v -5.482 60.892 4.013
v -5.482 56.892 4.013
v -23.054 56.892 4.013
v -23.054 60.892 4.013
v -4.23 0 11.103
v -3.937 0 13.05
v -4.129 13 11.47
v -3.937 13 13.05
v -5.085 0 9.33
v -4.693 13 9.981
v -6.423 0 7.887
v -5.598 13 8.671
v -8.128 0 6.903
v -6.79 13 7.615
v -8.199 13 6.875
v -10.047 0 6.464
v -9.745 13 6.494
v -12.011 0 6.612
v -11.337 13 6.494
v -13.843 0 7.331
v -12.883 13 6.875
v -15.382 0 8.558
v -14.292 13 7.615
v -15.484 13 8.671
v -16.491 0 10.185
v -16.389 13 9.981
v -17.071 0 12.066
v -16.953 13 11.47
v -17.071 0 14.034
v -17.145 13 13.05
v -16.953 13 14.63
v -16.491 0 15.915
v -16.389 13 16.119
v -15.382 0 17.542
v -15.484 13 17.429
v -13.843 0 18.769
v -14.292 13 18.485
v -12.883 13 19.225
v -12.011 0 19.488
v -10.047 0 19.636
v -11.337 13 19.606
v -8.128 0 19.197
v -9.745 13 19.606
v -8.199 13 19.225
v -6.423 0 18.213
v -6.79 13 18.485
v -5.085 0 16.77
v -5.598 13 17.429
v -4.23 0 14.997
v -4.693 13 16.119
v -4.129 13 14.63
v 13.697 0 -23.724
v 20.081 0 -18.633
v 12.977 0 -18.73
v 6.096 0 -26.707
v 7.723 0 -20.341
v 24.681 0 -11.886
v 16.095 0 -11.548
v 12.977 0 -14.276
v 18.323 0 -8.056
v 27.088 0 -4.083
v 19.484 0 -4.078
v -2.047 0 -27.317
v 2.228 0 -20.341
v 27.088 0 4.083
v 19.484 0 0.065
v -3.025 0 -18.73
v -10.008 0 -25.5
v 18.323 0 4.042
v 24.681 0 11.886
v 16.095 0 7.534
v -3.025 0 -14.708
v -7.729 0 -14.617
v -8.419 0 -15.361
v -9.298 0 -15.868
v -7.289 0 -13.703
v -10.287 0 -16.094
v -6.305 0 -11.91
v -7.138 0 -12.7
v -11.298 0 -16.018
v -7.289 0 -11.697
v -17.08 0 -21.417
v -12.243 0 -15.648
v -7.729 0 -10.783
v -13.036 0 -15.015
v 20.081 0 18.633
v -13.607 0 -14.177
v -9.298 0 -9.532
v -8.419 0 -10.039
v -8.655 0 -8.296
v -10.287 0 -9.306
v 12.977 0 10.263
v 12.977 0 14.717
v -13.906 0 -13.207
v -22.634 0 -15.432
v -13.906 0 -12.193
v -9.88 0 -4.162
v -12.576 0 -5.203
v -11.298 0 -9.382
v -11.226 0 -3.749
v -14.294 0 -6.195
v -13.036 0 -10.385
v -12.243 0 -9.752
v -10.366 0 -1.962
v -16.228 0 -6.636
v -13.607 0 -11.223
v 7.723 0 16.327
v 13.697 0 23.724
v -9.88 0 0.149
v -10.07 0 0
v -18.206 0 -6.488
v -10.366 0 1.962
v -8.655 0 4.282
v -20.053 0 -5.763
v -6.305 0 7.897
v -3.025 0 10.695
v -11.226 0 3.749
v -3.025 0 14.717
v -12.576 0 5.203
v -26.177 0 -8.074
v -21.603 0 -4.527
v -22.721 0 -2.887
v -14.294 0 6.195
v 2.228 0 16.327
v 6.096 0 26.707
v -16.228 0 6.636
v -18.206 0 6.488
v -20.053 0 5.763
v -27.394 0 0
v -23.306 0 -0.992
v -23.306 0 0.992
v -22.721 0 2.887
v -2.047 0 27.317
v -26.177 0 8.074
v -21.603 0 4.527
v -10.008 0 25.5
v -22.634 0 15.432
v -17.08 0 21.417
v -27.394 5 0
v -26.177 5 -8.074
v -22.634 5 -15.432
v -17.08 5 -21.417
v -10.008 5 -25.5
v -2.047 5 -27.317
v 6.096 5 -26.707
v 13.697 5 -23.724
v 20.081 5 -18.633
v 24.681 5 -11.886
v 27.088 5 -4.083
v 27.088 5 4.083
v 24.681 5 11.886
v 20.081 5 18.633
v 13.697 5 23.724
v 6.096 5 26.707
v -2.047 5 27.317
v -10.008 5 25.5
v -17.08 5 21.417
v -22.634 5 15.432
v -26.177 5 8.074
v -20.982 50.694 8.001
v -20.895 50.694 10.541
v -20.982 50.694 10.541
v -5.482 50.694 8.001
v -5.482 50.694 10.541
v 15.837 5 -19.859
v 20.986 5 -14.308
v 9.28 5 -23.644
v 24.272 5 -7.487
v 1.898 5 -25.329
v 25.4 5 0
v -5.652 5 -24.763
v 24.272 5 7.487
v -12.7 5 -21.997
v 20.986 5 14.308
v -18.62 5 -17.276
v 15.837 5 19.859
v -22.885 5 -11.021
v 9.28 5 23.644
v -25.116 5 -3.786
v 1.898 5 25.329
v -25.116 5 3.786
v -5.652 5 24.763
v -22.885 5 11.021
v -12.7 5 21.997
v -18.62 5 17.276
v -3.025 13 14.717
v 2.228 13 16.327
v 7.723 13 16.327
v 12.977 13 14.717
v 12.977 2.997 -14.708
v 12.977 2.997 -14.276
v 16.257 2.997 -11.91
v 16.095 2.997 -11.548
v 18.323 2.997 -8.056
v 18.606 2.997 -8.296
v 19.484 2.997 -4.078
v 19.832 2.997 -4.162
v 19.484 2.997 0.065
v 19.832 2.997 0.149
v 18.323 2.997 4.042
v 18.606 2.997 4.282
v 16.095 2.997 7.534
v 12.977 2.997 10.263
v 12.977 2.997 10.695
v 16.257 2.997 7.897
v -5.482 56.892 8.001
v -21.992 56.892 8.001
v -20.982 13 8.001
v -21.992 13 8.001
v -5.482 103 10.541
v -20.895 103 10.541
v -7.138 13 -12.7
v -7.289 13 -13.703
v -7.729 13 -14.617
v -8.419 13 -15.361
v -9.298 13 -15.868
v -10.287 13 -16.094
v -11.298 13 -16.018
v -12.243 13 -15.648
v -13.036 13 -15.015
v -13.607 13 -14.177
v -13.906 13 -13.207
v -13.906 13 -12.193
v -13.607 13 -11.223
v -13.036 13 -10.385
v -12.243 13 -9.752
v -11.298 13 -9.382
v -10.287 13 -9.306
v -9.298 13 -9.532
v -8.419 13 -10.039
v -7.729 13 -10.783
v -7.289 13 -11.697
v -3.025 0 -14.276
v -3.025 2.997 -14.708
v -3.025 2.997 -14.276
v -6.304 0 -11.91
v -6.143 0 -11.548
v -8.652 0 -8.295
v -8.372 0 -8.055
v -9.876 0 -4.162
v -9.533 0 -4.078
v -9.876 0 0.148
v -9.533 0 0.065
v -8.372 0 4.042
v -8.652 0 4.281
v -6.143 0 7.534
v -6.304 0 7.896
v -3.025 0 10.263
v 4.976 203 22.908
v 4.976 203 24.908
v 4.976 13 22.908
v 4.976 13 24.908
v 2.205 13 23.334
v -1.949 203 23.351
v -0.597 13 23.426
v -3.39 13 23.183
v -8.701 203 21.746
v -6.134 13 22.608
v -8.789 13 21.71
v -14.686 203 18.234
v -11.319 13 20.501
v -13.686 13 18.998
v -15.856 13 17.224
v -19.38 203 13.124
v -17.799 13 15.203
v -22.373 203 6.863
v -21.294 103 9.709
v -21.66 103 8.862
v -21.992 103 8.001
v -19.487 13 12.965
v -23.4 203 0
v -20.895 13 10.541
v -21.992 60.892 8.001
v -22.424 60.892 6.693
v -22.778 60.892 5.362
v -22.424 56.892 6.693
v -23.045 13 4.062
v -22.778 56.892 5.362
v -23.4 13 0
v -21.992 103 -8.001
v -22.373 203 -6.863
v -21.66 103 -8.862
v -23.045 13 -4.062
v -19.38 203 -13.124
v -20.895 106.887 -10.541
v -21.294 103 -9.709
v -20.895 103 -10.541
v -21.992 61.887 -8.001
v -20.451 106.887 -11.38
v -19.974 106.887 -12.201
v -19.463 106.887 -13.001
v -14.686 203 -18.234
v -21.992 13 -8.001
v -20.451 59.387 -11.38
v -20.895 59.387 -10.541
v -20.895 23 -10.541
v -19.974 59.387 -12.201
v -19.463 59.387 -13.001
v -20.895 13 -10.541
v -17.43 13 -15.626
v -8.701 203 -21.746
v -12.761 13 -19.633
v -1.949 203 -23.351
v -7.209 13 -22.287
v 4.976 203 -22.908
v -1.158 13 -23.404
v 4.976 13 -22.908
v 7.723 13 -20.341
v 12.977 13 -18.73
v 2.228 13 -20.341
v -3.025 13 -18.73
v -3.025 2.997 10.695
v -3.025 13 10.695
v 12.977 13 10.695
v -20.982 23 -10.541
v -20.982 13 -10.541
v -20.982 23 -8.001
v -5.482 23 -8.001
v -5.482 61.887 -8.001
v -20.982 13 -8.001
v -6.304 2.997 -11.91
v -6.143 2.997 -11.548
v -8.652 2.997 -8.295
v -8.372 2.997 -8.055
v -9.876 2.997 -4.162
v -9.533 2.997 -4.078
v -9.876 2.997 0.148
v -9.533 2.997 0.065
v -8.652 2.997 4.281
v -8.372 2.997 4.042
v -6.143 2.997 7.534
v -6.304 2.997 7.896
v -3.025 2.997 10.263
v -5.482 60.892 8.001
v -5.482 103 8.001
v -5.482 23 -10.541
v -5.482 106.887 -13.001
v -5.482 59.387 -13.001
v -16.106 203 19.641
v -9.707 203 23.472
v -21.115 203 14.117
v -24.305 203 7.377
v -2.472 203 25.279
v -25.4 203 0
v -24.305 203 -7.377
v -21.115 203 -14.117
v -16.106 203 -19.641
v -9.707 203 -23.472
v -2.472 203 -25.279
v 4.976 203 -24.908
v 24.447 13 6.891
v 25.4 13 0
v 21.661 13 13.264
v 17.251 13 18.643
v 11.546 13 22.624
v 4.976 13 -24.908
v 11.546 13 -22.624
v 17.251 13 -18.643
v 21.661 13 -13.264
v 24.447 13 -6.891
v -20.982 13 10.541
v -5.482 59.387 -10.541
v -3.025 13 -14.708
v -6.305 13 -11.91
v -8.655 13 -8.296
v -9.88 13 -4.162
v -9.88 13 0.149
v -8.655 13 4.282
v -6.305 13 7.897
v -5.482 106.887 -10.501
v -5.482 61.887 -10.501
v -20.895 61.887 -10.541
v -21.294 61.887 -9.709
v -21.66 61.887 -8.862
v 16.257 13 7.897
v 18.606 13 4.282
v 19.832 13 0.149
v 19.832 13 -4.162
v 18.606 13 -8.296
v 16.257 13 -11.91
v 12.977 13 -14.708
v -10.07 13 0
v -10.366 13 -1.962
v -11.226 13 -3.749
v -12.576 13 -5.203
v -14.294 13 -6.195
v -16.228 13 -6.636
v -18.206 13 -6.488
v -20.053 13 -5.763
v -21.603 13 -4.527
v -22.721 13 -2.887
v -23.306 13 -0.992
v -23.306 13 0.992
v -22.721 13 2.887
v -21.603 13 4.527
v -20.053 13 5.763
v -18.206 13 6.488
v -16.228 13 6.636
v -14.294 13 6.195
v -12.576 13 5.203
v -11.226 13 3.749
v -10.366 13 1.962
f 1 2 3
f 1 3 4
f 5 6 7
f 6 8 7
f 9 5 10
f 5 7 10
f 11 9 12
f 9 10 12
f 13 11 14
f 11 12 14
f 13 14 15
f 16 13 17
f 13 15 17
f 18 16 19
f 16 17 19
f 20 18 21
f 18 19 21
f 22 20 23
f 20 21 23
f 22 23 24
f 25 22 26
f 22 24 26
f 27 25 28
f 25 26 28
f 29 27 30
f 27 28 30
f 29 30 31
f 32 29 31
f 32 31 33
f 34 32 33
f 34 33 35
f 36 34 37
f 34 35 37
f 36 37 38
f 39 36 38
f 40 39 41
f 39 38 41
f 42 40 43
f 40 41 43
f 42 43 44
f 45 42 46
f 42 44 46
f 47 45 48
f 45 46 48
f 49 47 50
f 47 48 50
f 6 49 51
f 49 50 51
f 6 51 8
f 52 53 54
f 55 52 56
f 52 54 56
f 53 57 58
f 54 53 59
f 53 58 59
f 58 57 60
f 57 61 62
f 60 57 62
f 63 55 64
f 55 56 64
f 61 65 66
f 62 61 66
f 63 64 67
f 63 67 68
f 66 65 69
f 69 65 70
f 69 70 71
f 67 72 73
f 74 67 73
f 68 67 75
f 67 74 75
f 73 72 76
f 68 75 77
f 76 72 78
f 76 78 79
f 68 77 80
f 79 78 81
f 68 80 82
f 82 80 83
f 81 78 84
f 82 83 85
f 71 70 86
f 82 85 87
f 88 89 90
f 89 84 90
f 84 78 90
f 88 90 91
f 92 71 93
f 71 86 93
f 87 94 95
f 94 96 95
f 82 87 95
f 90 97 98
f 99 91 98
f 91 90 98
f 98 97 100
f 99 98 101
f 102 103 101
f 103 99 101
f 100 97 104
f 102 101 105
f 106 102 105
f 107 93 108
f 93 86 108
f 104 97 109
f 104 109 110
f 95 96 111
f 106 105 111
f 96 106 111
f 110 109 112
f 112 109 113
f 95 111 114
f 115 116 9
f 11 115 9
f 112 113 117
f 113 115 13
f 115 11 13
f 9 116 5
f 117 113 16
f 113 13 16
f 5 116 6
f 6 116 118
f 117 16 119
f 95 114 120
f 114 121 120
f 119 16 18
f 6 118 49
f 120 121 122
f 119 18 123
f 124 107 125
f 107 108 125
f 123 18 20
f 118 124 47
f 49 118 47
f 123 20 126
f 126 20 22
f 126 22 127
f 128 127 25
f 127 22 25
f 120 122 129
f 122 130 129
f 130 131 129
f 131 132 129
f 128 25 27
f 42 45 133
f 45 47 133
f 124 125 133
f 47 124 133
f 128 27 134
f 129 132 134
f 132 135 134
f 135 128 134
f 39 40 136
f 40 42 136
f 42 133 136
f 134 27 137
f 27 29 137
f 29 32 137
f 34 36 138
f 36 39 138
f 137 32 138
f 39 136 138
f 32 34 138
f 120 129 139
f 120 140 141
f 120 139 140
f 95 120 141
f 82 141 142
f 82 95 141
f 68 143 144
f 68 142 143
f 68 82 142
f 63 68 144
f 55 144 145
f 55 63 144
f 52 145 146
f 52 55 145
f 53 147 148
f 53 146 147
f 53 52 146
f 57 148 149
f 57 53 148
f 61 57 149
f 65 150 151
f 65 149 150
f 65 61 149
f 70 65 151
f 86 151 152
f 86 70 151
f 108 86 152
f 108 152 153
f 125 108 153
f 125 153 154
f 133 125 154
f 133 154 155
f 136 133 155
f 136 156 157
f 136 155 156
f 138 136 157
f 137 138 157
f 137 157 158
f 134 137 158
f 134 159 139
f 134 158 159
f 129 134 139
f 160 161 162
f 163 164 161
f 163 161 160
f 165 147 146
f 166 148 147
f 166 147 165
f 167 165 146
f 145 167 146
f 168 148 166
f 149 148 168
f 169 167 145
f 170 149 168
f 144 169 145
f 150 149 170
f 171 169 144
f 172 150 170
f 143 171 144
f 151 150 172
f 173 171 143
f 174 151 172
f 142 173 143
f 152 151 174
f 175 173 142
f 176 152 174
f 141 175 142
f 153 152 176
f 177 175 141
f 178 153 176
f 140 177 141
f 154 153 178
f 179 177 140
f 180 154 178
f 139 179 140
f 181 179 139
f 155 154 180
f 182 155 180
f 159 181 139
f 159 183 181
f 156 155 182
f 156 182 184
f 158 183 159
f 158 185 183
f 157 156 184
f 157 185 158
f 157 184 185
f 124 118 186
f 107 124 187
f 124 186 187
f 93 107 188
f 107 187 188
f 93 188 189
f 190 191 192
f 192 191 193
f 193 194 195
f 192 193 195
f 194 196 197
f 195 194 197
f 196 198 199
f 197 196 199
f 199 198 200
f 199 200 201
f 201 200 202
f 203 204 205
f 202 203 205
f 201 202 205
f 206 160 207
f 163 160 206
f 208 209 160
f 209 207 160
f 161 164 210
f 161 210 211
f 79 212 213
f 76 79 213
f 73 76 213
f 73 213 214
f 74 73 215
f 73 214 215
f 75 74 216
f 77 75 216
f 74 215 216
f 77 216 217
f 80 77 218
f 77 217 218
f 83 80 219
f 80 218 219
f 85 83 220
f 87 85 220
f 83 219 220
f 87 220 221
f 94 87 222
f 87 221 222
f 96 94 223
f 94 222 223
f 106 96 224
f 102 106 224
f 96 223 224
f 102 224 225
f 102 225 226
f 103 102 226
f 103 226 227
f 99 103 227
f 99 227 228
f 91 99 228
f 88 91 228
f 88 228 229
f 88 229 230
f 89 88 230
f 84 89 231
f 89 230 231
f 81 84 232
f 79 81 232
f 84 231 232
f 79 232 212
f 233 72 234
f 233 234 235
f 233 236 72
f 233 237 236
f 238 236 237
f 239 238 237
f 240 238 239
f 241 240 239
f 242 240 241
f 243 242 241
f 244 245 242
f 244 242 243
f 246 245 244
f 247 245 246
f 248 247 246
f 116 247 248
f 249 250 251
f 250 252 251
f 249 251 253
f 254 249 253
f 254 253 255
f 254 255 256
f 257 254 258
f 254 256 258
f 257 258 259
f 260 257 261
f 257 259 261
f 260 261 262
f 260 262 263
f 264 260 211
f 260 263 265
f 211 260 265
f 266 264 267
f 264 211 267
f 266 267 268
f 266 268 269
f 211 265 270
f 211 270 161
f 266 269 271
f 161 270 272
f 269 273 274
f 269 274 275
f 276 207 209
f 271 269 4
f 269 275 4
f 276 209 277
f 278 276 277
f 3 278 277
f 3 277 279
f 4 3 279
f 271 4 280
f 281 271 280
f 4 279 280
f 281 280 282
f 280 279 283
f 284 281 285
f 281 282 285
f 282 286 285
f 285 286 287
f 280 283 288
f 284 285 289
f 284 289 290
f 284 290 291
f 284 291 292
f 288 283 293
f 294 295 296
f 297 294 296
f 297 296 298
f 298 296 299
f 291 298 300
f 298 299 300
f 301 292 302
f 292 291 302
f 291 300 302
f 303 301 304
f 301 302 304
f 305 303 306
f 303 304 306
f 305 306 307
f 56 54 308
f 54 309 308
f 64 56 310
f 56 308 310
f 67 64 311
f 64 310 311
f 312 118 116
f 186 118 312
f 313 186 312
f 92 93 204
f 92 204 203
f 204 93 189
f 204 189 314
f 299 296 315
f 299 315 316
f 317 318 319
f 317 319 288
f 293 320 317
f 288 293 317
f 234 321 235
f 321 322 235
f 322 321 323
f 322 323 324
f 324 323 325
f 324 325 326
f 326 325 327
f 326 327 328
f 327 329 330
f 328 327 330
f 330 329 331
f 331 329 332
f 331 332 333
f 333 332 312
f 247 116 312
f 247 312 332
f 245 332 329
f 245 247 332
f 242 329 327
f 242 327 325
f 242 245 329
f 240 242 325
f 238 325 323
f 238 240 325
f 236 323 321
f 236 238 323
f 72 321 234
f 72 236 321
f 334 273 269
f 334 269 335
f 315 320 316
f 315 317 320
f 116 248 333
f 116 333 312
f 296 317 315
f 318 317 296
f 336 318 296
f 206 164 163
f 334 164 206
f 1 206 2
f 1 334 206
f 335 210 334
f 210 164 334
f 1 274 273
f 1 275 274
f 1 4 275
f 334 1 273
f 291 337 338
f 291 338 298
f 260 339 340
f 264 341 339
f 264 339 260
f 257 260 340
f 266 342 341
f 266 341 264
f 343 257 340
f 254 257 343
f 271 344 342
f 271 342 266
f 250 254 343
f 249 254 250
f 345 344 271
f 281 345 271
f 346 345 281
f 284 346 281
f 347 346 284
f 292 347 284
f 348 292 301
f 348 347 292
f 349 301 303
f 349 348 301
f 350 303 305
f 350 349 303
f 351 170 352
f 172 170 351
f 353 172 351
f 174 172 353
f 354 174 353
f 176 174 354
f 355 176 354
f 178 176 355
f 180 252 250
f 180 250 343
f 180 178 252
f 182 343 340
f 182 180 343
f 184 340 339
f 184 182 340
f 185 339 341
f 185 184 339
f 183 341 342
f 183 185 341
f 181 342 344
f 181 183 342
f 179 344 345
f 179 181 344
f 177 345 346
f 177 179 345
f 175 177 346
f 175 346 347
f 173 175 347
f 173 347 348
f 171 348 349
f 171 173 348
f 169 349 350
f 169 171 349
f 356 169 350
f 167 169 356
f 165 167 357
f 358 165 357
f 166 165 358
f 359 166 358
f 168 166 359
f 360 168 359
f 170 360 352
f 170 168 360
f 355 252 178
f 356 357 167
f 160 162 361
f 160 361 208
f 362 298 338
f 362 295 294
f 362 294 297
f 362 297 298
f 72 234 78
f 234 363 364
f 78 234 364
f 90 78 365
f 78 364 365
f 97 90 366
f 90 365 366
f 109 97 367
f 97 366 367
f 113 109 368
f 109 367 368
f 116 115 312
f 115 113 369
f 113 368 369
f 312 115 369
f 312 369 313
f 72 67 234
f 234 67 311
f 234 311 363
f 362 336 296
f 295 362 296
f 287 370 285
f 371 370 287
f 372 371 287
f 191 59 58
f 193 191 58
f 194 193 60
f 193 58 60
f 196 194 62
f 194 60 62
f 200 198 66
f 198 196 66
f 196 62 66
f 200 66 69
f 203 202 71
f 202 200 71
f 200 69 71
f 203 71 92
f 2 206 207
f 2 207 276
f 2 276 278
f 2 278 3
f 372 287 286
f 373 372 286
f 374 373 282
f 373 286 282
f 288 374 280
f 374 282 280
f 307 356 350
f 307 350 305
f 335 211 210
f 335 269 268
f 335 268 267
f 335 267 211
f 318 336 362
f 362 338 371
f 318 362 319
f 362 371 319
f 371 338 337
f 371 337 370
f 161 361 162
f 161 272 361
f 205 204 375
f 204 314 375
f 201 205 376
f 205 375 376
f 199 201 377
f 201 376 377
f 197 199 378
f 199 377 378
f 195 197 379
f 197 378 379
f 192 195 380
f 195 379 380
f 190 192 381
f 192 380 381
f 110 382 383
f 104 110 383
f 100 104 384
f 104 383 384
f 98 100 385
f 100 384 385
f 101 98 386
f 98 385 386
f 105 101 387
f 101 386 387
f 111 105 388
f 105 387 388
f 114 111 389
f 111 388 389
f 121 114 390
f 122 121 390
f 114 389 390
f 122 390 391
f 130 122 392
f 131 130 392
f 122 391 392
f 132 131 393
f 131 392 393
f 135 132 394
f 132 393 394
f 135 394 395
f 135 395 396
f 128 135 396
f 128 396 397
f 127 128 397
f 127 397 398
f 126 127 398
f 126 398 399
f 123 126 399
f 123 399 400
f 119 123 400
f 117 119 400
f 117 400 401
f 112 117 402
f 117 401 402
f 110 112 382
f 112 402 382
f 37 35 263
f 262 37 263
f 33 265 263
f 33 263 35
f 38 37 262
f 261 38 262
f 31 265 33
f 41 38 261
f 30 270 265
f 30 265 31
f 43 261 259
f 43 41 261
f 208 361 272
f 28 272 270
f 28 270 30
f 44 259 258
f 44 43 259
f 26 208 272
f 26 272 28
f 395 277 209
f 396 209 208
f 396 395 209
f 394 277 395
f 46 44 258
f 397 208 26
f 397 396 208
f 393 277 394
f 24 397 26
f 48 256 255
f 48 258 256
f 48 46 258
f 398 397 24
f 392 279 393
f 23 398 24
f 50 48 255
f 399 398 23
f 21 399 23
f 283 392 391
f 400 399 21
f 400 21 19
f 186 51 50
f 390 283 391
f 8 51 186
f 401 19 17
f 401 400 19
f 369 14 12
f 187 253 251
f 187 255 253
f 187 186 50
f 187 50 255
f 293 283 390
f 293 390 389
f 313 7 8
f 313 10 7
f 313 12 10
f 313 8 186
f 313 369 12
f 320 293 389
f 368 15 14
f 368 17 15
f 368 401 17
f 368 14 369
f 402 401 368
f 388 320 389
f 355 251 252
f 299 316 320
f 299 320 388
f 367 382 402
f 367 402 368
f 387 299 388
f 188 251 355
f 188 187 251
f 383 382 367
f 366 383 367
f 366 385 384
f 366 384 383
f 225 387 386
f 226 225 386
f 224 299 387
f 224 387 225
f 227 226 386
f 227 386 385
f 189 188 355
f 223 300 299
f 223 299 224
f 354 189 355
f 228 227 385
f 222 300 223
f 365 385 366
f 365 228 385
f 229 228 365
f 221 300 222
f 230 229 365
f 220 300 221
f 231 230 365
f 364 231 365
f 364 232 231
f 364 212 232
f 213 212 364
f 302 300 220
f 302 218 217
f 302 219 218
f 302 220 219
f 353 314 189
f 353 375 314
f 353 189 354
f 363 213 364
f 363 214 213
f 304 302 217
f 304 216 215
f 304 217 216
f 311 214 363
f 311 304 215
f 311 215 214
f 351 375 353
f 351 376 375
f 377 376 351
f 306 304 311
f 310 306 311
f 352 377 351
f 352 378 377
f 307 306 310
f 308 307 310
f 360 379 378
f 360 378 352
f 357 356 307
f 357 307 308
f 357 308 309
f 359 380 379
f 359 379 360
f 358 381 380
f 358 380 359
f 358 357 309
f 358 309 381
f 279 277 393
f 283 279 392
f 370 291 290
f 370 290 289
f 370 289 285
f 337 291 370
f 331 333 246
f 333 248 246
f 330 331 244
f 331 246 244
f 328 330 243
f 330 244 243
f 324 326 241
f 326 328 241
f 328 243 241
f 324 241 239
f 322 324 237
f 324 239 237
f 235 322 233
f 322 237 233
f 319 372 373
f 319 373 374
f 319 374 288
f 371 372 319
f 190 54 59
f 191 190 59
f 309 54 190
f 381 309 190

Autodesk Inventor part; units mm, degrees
ref_plane "YZ Plane" through (0, 0, 0) normal (1, 0, 0) x (0, 1, 0)
ref_plane "XZ Plane" through (0, 0, 0) normal (0, 1, 0) x (-1, 0, 0)
ref_plane "XY Plane" through (0, 0, 0) normal (0, 0, 1) x (1, 0, 0)
sketch "Sketch1" plane through (0, 0, 0) normal (0, 1, 0) x (-1, 0, 0)
  circle A0 centre (0, 0) radius 27.3939
  dimension "d0" = 54.7878
extrude "Extrusion1" add sketch "Sketch1" along normal blind 5
sketch "Sketch2" plane through (0, 5, 0) normal (0, 1, 0) x (1, 0, 0)
  circle A0 centre (0, 0) radius 25.4
  dimension "d3" = 50.8
extrude "Extrusion2" add sketch "Sketch2" along normal blind 8
sketch "Sketch3" plane through (0, 13, 0) normal (0, 1, 0) x (1, 0, 0)
  line L0 (0, 0) -> (0, 25.4)
  circle A0 centre (0, 0) radius 25.4
  line L1 (0, 0) -> (0, -25.4)
  arc A1 (0, 25.4) -> (0, -25.4) centre (0, 0) ccw
  line L2 (0, -25.4) -> (4.975722, -24.907874)
  arc A2 (0, -25.4) -> (4.975722, -24.907874) centre (0, 0) ccw
  line L3 (0, 25.4) -> (4.975722, 24.907874)
  arc A3 (4.975722, 24.907874) -> (0, 25.4) centre (0, 0) ccw
  line L4 (4.975722, 24.907874) -> (4.975722, 22.907874)
  line L5 (4.975722, -24.907874) -> (4.975722, -22.907874)
  line L6 (-25.4, 0) -> (-23.4, 0)
  arc A4 (4.975722, 22.907874) -> (4.975722, -22.907874) centre (0.034686, 0) ccw
  dimension "d6" = 25.4
  dimension "d7" = 5
  dimension "d8" = 5
  dimension "d9" = 2
  dimension "d10" = 2
  dimension "d11" = 2
extrude "Extrusion3" add sketch "Sketch3" along normal blind 190 contours A4 L6 A0 L0 | L0 L3 L4 A4 | A4 L5 L2 L1 | L1 A0 L6 A4 | A0 L3 | L2 A0
sketch "Sketch4" plane through (0, 13, 0) normal (0, 1, 0) x (1, 0, 0)
  line L0 (4.975722, 22.907874) -> (4.975722, 24.907874)
  line L1 (4.975722, 22.907874) -> (4.975722, 20.545874)
  line L2 (4.975722, 20.545874) -> (4.975722, -16.532126)
  line L3 (4.975722, -16.532126) -> (4.975722, 2.006874)
  circle A0 centre (4.975722, 2.006874) radius 18.539
  line L4 (4.975722, -16.532126) -> (-3.025278, -16.532126)
  line L5 (-3.025278, -16.532126) -> (4.975722, -16.532126)
  line L6 (4.975722, -16.532126) -> (12.976722, -16.532126)
  line L7 (4.975722, 20.545874) -> (12.976722, 20.545874)
  line L8 (4.975722, 20.545874) -> (-3.025278, 20.545874)
  line L9 (-3.025278, 20.545874) -> (-3.025278, 18.730466)
  line L10 (12.976722, 20.545874) -> (12.976722, 18.730466)
  line L11 (12.976722, -16.532126) -> (12.976722, -14.716718)
  line L12 (-3.025278, -16.532126) -> (-3.025278, -14.716718)
  arc A1 (-3.025278, -14.716718) -> (12.976722, -14.716718) centre (4.975722, 2.006874) ccw
  arc A2 (12.976722, 18.730466) -> (-3.025278, 18.730466) centre (4.975722, 2.006874) ccw
  line L13 (12.976722, -14.716718) -> (12.976722, -10.728918)
  line L14 (-3.025278, -14.716718) -> (-3.025278, -10.728918)
  line L15 (-3.025278, 18.730466) -> (-3.025278, 14.742666)
  line L16 (12.976722, 18.730466) -> (12.976722, 14.742666)
  circle A3 centre (4.975722, 2.006874) radius 15.0114
  line L17 (12.976722, -10.728918) -> (12.976722, -10.694548)
  line L18 (-3.025278, -10.728918) -> (-3.025278, -10.694548)
  line L19 (-3.025278, 14.742666) -> (-3.025278, 14.708296)
  line L20 (12.976722, 14.742666) -> (12.976722, 14.708296)
  point P0 (0, 0)
  dimension "d14" = 2.362
  dimension "d15" = 37.078
  dimension "d16" = 18.539
  dimension "d18" = 8.001
  dimension "d19" = 8.001
  dimension "d20" = 8.001
  dimension "d21" = 8.001
  dimension "d22" = 3.9878
  dimension "d23" = 3.9878
  dimension "d24" = 3.9878
  dimension "d25" = 3.9878
  dimension "d26" = 30.0228
extrude "Extrusion4" cut sketch "Sketch4" against normal blind 15 contours A0 L16 L20 A3 L2 | L2 A3 L19 L15 A0 | A3 L2 | L2 A3 | L14 L18 A3 L2 A0 | A3 L17 L13 A0 L2
sketch "Sketch5" plane through (0, 0, 0) normal (0, -1, 0) x (1, 0, 0)
  arc A0 (-3.025278, 10.694548) -> (-3.025278, -14.708296) centre (4.975722, -2.006874) ccw
  line L0 (-3.025278, 10.694548) -> (-3.025278, 10.262748)
  line L1 (-3.025278, -14.708296) -> (-3.025278, -14.276296)
  line L2 (12.976722, -14.708296) -> (12.976722, -14.276496)
  arc A1 (12.976722, -14.708296) -> (12.976722, 10.694548) centre (4.975722, -2.006874) ccw
  line L3 (12.976722, 10.694548) -> (12.976722, 10.262748)
  line L4 (19.987122, -2.006874) -> (19.631522, -2.006874)
  line L5 (-10.035678, -2.006874) -> (-9.680078, -2.006874)
  arc A2 (-3.025278, 10.262748) -> (-3.025278, -14.276296) centre (4.958044, -2.006774) ccw
  arc A3 (-3.025278, 10.694548) -> (-3.025278, -14.708296) centre (4.975722, -2.006874) ccw
  arc A4 (-3.025278, 10.694548) -> (-3.025278, -14.708296) centre (4.984051, -2.006874) ccw
  arc A5 (12.976722, -14.276496) -> (12.976722, 10.262748) centre (4.993216, -2.006874) ccw
  arc A6 (12.976722, -14.708296) -> (12.976722, 10.694548) centre (4.975722, -2.006874) ccw
  point P0 (0, 0)
  dimension "d29" = 0.4318
  dimension "d30" = 0.432
  dimension "d31" = 0.4318
  dimension "d32" = 0.4318
  dimension "d33" = 0.3556
  dimension "d34" = 0.3556
sketch "Sketch5 outline for Extrusion5" plane through (0, 0, 0) normal (0, -1, 0) x (1, 0, 0)
  line L0 (-3.025278, 10.262748) -> (-3.025278, 10.694548)
  arc A0 (-3.025278, -14.276296) -> (-3.025278, 10.262748) centre (4.958044, -2.006774) cw
  line L1 (-3.025278, -14.708296) -> (-3.025278, -14.276296)
  arc A1 (-3.025278, 10.694548) -> (-3.025278, -14.708296) centre (4.984051, -2.006874) ccw
  line L2 (12.976722, 10.694548) -> (12.976722, 10.262748)
  arc A2 (12.976722, -14.708296) -> (12.976722, 10.694548) centre (4.975722, -2.006874) ccw
  line L3 (12.976722, -14.276496) -> (12.976722, -14.708296)
  arc A3 (12.976722, 10.262748) -> (12.976722, -14.276496) centre (4.993216, -2.006874) cw
extrude "Extrusion5" add sketch "Sketch5 outline for Extrusion5" against normal blind 2.997
sketch "Sketch6" plane through (0, 13, 0) normal (0, 1, 0) x (1, 0, 0)
  line L0 (0, 0) -> (-16.725, 0)
  circle A0 centre (-16.725, 0) radius 6.655
  line L1 (-16.725, 0) -> (-16.725, 12.7)
  line L2 (0, 0) -> (0, 28.039513)
  line L3 (-16.725, 12.7) -> (0, 12.7)
  line L4 (0, 12.7) -> (-10.541, 12.7)
  circle A1 centre (-10.541, 12.7) radius 3.4035
  line L5 (-16.725, 0) -> (-16.725, -13.05)
  line L6 (-16.725, -13.05) -> (0.459, -13.05)
  line L7 (0.459, -13.05) -> (-10.541, -13.05)
  circle A2 centre (-10.541, -13.05) radius 6.604
  dimension "d37" = 16.725
  dimension "d38" = 13.31
  dimension "d39" = 12.7
  dimension "d40" = 10.541
  dimension "d41" = 6.807
  dimension "d42" = 13.05
  dimension "d43" = 11
  dimension "d44" = 13.208
extrude "Extrusion6" cut sketch "Sketch6" against normal blind 15 contours A0 L5 L0 | L0 L1 A0 | L5 A0 L1 | A1 L3 | L3 A1 | A2 L6 L5 | L5 L6 A2
sketch "Sketch12" plane through (0, 13, 0) normal (0, 1, 0) x (1, 0, 0)
  circle A0 centre (-16.725, 0) radius 6.655
  line L0 (-16.725, 0) -> (-16.725, -8.001)
  line L1 (-16.725, 0) -> (-16.725, 8.001)
  line L2 (-16.725, 8.001) -> (-21.991855, 8.001)
  arc A1 (4.975722, 22.907874) -> (4.975722, -22.907874) centre (0.034686, 0) ccw
  line L3 (-21.991855, 8.001) -> (-5.481855, 8.001)
  line L4 (-16.725, -8.001) -> (-21.991855, -8.001)
  line L5 (-21.991855, -8.001) -> (-5.481855, -8.001)
  line L6 (-5.481855, -8.001) -> (-5.481855, -10.541)
  line L7 (-5.481855, -10.541) -> (-20.89548, -10.541)
  line L8 (-5.481855, 8.001) -> (-5.481855, 10.541)
  line L9 (-5.481855, 10.541) -> (-20.89548, 10.541)
  arc A2 (-20.89548, 10.541) -> (-21.991855, 8.001) centre (0.034686, 0) ccw
  arc A3 (-21.991855, -8.001) -> (-20.89548, -10.541) centre (0.034686, 0) ccw
  point P0 (0, 0)
  dimension "d74" = 8.001
  dimension "d75" = 8.001
  dimension "d76" = 16.51
  dimension "d77" = 16.51
  dimension "d78" = 2.54
  dimension "d79" = 2.54
extrude "Extrusion10" add sketch "Sketch12" along normal blind 90 contours L2 A1 L9 L8 L3 | L5 L6 L7 A1 L4
sketch "Sketch13" plane through (-5.481855, 13, 8.001) normal (1, 0, 0) x (0, 0, -1)
  line L0 (0, 0) -> (-2.54, 0)
  line L1 (-2.54, 0) -> (-2.54, 37.6936)
  line L2 (-2.54, 37.6936) -> (0, 37.6936)
  line L3 (0, 37.6936) -> (0, 0)
  line L4 (16.002, 0) -> (18.542, 0) projected
  line L5 (18.542, 0) -> (16.002, 0)
  line L6 (16.002, 0) -> (16.002, 10)
  line L7 (16.002, 10) -> (18.542, 10)
  line L8 (18.542, 10) -> (18.542, 0)
  line L9 (16.002, 10) -> (16.002, 48.8874)
  line L10 (16.002, 48.8874) -> (18.542, 48.8874)
  line L11 (18.542, 90) -> (18.542, 0) projected
  line L12 (18.542, 48.8874) -> (18.542, 90)
  line L13 (16.002, 0) -> (16.002, 90) projected
  line L14 (16.002, 90) -> (16.002, 48.8874)
  line L15 (18.542, 90) -> (16.002, 90)
  point P0 (8.001, -13)
  dimension "d83" = 37.6936
  dimension "d84" = 10
  dimension "d85" = 38.8874
sketch "Sketch14" plane through (0, 103, 0) normal (0, 1, 0) x (1, 0, 0)
  line L0 (-5.481855, 8.001) -> (-5.481855, 10.541)
  line L1 (-5.481855, 10.541) -> (-5.481855, 8.001)
  line L2 (-5.481855, 10.541) -> (-20.801621, 10.541)
  arc A0 (-20.89548, 10.541) -> (-21.991855, 8.001) centre (0.034686, 0) ccw
  arc A1 (-20.89548, 10.541) -> (-20.89548, -10.541) centre (0.034686, 0) ccw
  line L3 (-5.481855, 8.001) -> (-21.991855, 8.001)
  line L4 (-5.481855, 10.541) -> (-20.89548, 10.541)
  point P0 (0, 0)
extrude "Extrusion11" cut sketch "Sketch14" against normal blind 41.113
sketch "Sketch15" plane through (0, 13, 0) normal (0, -1, 0) x (1, 0, 0)
  line L0 (-20.89548, -10.541) -> (-5.481855, -10.541)
  line L1 (-5.481855, -10.541) -> (-20.89548, -10.541)
  line L2 (-8.787002, -8.001) -> (-21.991855, -8.001)
  line L3 (-5.481763, -8.001) -> (-21.991855, -8.001)
  arc A0 (-21.991855, -8.001) -> (-20.89548, -10.541) centre (0.034686, 0) ccw
  line L4 (-16.649824, 10.541) -> (-5.481855, 10.541)
  line L5 (-5.481855, 10.541) -> (-21.991855, 10.541)
  line L6 (-5.481855, 8.001) -> (-6.21287, 8.001)
  line L7 (-5.481855, 10.541) -> (-5.481855, 8.001)
  line L8 (-5.481855, 8.001) -> (-20.514232, 8.001)
  line L9 (-5.481855, 10.541) -> (-21.991855, 10.541)
  arc A1 (4.975722, 22.907874) -> (-20.89548, 10.541) centre (0.034686, 0) ccw
  line L10 (-20.89548, 10.541) -> (-23.544024, 10.541)
  line L11 (-23.544024, 10.541) -> (-21.025013, 10.541)
  line L12 (-20.89548, 10.541) -> (-5.481855, 10.541)
  line L13 (-5.481855, 8.001) -> (-24.106928, 8.001)
  circle A2 centre (0, 0) radius 25.4
  arc A3 (-23.109464, 10.541) -> (-24.106928, 8.001) centre (0, 0) ccw
  line L14 (-23.109464, 10.541) -> (-5.481855, 10.541)
extrude "Extrusion12" cut sketch "Sketch13" against normal blind 15.5 contours L0 L1 L2 L3 | L6 L7 L8 L4
sketch "Sketch16" plane through (0, 61.887, 0) normal (0, 1, 0) x (1, 0, 0)
  line L0 (-5.481855, 8.001) -> (-21.991855, 8.001)
  line L1 (-5.481855, 8.001) -> (-5.481855, 13.001)
  line L2 (-5.481855, 10.501) -> (-20.89548, 10.541)
  arc A0 (-20.89548, 10.541) -> (-21.991855, 8.001) centre (0.034686, 0) ccw
  arc A1 (-20.89548, 10.541) -> (-21.991855, 8.001) centre (0.034686, 0) ccw
  line L3 (-5.481855, 13.001) -> (-19.462968, 13.001)
  arc A2 (-19.462968, 13.001) -> (-20.89548, 10.541) centre (0.034686, 0) ccw
  point P0 (0, 0)
  dimension "d90" = 5
extrude "Extrusion13" add sketch "Sketch16" along normal blind 45 contours L2 A2 L3 L1
sketch "Sketch17" plane through (0, 61.887, 0) normal (0, -1, 0) x (1, 0, 0)
  line L0 (-5.481855, -13.001) -> (-5.481855, -10.541)
  arc A0 (-20.89548, -10.541) -> (-19.462968, -13.001) centre (0.034686, 0) ccw
  line L1 (-20.89548, -10.541) -> (-5.481855, -10.541)
  line L2 (-20.89548, -10.541) -> (-5.481855, -10.541)
  line L3 (-5.481855, -13.001) -> (-19.462968, -13.001)
  line L4 (-19.462968, -13.001) -> (-5.481855, -13.001)
  arc A1 (-20.89548, -10.541) -> (-19.462968, -13.001) centre (0.034686, 0) ccw
  point P0 (0, 0)
extrude "Extrusion14" add sketch "Sketch17" along normal blind 2.5
sketch "Sketch18" plane through (-5.481855, 103, 10.541) normal (1, 0, 0) x (0, 0, -1)
  line L0 (0, -52.3064) -> (2.54, -52.3064)
  line L1 (2.54, -52.3064) -> (2.54, -46.1084)
  line L2 (2.54, -52.3064) -> (6.5278, -52.3064)
  line L3 (2.54, -46.1084) -> (2.54, -50.0964)
  line L4 (2.54, -52.3064) -> (2.54, 0) projected
  line L5 (2.54, -46.1084) -> (6.528, -46.1084)
  line L6 (6.528, -46.1084) -> (6.528, -42.1084)
  line L7 (6.528, -42.1084) -> (2.54, -42.1084)
  point P0 (10.541, -103)
  dimension "d95" = 6.198
  dimension "d97" = 3.9878
  dimension "d98" = 3.988
  dimension "d99" = 3.988
  dimension "d100" = 4
extrude "Extrusion15" add sketch "Sketch18" against normal blind 18
properties part number "shortened chassis"
